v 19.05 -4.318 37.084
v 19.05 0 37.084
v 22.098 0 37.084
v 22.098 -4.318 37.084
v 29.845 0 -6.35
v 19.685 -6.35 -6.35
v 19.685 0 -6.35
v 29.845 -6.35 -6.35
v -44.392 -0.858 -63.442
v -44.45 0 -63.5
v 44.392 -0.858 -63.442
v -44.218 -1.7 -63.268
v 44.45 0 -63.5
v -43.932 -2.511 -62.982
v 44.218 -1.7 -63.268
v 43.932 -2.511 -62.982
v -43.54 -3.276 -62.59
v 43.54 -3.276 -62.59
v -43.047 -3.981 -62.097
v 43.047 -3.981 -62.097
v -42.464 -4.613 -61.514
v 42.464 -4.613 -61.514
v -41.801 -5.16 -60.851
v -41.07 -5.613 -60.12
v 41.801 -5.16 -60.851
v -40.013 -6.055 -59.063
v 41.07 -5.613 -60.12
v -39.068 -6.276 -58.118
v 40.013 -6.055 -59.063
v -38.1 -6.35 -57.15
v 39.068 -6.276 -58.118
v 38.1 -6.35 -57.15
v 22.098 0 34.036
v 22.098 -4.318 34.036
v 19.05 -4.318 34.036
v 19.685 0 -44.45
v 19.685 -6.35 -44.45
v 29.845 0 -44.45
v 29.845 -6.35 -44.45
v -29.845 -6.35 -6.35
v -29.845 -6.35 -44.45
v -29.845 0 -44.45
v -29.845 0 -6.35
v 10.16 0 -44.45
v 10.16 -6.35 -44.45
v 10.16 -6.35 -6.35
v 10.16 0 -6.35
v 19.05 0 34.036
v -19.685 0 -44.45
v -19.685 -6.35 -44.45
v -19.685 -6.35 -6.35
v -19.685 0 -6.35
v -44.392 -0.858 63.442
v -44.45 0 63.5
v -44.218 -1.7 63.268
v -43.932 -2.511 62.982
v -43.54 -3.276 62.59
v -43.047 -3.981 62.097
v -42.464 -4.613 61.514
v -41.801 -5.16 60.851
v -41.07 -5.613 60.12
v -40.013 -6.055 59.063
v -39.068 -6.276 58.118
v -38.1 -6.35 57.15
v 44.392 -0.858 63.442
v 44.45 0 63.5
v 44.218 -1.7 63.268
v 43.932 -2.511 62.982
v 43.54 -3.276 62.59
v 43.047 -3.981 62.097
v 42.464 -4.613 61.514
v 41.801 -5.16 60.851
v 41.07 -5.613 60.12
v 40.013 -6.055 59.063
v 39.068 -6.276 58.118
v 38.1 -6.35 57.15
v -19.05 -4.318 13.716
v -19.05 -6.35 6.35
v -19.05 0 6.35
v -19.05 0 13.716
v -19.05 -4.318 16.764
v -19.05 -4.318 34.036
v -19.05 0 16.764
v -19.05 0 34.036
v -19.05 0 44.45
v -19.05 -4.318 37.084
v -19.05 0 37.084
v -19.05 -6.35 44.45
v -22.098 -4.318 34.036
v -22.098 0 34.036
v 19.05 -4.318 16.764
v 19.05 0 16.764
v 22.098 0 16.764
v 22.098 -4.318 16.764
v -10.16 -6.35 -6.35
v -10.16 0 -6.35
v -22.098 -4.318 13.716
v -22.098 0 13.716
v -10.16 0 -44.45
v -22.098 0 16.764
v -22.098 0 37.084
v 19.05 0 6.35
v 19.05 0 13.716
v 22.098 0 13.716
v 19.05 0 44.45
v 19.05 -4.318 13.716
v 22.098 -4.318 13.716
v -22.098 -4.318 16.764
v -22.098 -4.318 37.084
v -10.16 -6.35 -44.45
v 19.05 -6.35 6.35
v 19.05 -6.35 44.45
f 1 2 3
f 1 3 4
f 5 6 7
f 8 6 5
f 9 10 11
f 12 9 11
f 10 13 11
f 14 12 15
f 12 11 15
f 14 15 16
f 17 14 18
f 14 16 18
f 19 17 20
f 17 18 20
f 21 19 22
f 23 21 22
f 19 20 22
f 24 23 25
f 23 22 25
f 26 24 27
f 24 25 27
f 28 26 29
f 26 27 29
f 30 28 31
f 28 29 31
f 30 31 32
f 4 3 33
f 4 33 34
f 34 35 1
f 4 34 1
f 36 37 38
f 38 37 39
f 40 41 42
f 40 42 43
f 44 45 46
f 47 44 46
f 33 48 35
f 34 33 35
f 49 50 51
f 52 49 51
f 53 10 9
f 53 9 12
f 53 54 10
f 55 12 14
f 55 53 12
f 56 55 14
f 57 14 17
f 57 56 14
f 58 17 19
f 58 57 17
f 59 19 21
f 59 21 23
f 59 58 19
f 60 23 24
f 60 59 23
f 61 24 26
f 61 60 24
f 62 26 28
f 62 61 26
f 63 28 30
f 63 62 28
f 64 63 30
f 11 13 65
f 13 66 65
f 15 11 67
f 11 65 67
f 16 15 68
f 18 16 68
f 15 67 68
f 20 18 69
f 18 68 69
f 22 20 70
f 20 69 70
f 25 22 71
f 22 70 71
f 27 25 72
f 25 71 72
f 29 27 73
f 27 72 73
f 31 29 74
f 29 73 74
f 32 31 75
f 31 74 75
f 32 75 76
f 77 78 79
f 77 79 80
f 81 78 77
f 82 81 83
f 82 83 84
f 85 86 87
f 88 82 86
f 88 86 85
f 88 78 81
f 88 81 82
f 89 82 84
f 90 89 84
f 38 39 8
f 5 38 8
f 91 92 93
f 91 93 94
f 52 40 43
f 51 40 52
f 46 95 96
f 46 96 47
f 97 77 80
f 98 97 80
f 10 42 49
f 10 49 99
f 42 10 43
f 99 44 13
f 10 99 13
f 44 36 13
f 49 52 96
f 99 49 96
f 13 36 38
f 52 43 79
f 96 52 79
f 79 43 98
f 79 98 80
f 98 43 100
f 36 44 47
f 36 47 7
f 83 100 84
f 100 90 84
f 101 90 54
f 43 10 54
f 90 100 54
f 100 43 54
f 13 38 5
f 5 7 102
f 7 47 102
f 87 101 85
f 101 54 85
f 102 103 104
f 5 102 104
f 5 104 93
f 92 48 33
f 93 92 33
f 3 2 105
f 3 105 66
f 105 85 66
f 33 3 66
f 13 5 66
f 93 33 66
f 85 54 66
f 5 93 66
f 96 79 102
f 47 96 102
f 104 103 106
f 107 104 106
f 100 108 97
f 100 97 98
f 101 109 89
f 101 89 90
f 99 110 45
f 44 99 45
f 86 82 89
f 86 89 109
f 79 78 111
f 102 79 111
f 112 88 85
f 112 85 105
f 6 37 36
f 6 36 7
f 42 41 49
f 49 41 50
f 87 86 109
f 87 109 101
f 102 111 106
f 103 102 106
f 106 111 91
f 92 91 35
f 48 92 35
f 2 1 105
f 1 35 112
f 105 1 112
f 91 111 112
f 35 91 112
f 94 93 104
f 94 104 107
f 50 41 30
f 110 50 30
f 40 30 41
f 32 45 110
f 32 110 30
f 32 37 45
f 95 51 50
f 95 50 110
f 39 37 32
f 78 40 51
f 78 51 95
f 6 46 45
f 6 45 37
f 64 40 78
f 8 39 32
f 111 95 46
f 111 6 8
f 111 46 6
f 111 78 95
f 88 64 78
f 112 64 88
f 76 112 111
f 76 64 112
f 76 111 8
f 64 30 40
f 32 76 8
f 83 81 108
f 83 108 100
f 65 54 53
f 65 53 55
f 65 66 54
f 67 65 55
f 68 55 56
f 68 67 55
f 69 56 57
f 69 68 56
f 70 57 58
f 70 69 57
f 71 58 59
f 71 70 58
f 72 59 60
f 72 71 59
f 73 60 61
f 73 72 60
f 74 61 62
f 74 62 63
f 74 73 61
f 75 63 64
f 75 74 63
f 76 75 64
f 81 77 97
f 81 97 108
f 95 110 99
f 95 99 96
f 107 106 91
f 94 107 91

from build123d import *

# Parameters (mm, degrees)
F0_W      = 88.9
F0_H      = 127
F1_DEPTH  = 6.35
F2_R      = 6.34999
F3_W      = 38.1
F3_H      = 38.1
F4_DEPTH  = 6.351
F5_W      = 20.32
F5_H      = 38.1
F5_W_2    = 10.16
F6_DEPTH  = 6.351
F7_W      = 4.318
F7_H      = 3.048
F8_DEPTH  = 3.048
F9_W      = 4.318
F9_H      = 3.048
F10_DEPTH = 3.048


# Not quite as in the source:
# - a fillet or chamfer is up to 0.001 mm smaller than in the source, because OpenCascade refuses the exact size


with BuildPart() as f1:
    # F0 (on Front) → F1 (new body)
    with BuildSketch(Plane.XZ):
        Rectangle(F0_W, F0_H)
    extrude(amount=F1_DEPTH)

    # F2 (radius 6.35 in the source; OpenCascade refuses exactly that, so slightly less here)
    f2_edges = [f1.edges().sort_by_distance(p)[0] for p in [
        (-44.45, -6.35, 0),
        (0, -6.35, 63.5),
        (44.45, -6.35, 0),
        (0, -6.35, -63.5),
    ]]
    fillet(f2_edges, radius=F2_R)

    # F3 (on face) → F4 (cut, through all)
    with BuildSketch(Plane.XZ.offset(6.35)):
        with Locations((0, 25.4)):
            Rectangle(F3_W, F3_H)
    extrude(amount=-F4_DEPTH, mode=Mode.SUBTRACT)

    # F5 (on face) → F6 (cut, through all)
    with BuildSketch(Plane.XZ.offset(6.35)):
        with Locations((0, -25.4)):
            Rectangle(F5_W, F5_H)
        with Locations((-24.765, -25.4)):
            Rectangle(F5_W_2, F5_H)
        with Locations((24.765, -25.4)):
            Rectangle(F5_W_2, F5_H)
    extrude(amount=-F6_DEPTH, mode=Mode.SUBTRACT)

    # F7 (on face) → F8 (cut)
    with BuildSketch(Plane.YZ.offset(-19.05)):
        with Locations((-2.159, 35.56)):
            Rectangle(F7_W, F7_H)
        with Locations((-2.159, 15.24)):
            Rectangle(F7_W, F7_H)
    extrude(amount=-F8_DEPTH, mode=Mode.SUBTRACT)

    # F9 (on face) → F10 (cut)
    with BuildSketch(Plane(origin=(19.05, 0, 0), x_dir=(0, -1, 0), z_dir=(-1, 0, 0))):
        with Locations((2.159, 15.24)):
            Rectangle(F9_W, F9_H)
        with Locations((2.159, 35.56)):
            Rectangle(F9_W, F9_H)
    extrude(amount=-F10_DEPTH, mode=Mode.SUBTRACT)


solid = f1.part
